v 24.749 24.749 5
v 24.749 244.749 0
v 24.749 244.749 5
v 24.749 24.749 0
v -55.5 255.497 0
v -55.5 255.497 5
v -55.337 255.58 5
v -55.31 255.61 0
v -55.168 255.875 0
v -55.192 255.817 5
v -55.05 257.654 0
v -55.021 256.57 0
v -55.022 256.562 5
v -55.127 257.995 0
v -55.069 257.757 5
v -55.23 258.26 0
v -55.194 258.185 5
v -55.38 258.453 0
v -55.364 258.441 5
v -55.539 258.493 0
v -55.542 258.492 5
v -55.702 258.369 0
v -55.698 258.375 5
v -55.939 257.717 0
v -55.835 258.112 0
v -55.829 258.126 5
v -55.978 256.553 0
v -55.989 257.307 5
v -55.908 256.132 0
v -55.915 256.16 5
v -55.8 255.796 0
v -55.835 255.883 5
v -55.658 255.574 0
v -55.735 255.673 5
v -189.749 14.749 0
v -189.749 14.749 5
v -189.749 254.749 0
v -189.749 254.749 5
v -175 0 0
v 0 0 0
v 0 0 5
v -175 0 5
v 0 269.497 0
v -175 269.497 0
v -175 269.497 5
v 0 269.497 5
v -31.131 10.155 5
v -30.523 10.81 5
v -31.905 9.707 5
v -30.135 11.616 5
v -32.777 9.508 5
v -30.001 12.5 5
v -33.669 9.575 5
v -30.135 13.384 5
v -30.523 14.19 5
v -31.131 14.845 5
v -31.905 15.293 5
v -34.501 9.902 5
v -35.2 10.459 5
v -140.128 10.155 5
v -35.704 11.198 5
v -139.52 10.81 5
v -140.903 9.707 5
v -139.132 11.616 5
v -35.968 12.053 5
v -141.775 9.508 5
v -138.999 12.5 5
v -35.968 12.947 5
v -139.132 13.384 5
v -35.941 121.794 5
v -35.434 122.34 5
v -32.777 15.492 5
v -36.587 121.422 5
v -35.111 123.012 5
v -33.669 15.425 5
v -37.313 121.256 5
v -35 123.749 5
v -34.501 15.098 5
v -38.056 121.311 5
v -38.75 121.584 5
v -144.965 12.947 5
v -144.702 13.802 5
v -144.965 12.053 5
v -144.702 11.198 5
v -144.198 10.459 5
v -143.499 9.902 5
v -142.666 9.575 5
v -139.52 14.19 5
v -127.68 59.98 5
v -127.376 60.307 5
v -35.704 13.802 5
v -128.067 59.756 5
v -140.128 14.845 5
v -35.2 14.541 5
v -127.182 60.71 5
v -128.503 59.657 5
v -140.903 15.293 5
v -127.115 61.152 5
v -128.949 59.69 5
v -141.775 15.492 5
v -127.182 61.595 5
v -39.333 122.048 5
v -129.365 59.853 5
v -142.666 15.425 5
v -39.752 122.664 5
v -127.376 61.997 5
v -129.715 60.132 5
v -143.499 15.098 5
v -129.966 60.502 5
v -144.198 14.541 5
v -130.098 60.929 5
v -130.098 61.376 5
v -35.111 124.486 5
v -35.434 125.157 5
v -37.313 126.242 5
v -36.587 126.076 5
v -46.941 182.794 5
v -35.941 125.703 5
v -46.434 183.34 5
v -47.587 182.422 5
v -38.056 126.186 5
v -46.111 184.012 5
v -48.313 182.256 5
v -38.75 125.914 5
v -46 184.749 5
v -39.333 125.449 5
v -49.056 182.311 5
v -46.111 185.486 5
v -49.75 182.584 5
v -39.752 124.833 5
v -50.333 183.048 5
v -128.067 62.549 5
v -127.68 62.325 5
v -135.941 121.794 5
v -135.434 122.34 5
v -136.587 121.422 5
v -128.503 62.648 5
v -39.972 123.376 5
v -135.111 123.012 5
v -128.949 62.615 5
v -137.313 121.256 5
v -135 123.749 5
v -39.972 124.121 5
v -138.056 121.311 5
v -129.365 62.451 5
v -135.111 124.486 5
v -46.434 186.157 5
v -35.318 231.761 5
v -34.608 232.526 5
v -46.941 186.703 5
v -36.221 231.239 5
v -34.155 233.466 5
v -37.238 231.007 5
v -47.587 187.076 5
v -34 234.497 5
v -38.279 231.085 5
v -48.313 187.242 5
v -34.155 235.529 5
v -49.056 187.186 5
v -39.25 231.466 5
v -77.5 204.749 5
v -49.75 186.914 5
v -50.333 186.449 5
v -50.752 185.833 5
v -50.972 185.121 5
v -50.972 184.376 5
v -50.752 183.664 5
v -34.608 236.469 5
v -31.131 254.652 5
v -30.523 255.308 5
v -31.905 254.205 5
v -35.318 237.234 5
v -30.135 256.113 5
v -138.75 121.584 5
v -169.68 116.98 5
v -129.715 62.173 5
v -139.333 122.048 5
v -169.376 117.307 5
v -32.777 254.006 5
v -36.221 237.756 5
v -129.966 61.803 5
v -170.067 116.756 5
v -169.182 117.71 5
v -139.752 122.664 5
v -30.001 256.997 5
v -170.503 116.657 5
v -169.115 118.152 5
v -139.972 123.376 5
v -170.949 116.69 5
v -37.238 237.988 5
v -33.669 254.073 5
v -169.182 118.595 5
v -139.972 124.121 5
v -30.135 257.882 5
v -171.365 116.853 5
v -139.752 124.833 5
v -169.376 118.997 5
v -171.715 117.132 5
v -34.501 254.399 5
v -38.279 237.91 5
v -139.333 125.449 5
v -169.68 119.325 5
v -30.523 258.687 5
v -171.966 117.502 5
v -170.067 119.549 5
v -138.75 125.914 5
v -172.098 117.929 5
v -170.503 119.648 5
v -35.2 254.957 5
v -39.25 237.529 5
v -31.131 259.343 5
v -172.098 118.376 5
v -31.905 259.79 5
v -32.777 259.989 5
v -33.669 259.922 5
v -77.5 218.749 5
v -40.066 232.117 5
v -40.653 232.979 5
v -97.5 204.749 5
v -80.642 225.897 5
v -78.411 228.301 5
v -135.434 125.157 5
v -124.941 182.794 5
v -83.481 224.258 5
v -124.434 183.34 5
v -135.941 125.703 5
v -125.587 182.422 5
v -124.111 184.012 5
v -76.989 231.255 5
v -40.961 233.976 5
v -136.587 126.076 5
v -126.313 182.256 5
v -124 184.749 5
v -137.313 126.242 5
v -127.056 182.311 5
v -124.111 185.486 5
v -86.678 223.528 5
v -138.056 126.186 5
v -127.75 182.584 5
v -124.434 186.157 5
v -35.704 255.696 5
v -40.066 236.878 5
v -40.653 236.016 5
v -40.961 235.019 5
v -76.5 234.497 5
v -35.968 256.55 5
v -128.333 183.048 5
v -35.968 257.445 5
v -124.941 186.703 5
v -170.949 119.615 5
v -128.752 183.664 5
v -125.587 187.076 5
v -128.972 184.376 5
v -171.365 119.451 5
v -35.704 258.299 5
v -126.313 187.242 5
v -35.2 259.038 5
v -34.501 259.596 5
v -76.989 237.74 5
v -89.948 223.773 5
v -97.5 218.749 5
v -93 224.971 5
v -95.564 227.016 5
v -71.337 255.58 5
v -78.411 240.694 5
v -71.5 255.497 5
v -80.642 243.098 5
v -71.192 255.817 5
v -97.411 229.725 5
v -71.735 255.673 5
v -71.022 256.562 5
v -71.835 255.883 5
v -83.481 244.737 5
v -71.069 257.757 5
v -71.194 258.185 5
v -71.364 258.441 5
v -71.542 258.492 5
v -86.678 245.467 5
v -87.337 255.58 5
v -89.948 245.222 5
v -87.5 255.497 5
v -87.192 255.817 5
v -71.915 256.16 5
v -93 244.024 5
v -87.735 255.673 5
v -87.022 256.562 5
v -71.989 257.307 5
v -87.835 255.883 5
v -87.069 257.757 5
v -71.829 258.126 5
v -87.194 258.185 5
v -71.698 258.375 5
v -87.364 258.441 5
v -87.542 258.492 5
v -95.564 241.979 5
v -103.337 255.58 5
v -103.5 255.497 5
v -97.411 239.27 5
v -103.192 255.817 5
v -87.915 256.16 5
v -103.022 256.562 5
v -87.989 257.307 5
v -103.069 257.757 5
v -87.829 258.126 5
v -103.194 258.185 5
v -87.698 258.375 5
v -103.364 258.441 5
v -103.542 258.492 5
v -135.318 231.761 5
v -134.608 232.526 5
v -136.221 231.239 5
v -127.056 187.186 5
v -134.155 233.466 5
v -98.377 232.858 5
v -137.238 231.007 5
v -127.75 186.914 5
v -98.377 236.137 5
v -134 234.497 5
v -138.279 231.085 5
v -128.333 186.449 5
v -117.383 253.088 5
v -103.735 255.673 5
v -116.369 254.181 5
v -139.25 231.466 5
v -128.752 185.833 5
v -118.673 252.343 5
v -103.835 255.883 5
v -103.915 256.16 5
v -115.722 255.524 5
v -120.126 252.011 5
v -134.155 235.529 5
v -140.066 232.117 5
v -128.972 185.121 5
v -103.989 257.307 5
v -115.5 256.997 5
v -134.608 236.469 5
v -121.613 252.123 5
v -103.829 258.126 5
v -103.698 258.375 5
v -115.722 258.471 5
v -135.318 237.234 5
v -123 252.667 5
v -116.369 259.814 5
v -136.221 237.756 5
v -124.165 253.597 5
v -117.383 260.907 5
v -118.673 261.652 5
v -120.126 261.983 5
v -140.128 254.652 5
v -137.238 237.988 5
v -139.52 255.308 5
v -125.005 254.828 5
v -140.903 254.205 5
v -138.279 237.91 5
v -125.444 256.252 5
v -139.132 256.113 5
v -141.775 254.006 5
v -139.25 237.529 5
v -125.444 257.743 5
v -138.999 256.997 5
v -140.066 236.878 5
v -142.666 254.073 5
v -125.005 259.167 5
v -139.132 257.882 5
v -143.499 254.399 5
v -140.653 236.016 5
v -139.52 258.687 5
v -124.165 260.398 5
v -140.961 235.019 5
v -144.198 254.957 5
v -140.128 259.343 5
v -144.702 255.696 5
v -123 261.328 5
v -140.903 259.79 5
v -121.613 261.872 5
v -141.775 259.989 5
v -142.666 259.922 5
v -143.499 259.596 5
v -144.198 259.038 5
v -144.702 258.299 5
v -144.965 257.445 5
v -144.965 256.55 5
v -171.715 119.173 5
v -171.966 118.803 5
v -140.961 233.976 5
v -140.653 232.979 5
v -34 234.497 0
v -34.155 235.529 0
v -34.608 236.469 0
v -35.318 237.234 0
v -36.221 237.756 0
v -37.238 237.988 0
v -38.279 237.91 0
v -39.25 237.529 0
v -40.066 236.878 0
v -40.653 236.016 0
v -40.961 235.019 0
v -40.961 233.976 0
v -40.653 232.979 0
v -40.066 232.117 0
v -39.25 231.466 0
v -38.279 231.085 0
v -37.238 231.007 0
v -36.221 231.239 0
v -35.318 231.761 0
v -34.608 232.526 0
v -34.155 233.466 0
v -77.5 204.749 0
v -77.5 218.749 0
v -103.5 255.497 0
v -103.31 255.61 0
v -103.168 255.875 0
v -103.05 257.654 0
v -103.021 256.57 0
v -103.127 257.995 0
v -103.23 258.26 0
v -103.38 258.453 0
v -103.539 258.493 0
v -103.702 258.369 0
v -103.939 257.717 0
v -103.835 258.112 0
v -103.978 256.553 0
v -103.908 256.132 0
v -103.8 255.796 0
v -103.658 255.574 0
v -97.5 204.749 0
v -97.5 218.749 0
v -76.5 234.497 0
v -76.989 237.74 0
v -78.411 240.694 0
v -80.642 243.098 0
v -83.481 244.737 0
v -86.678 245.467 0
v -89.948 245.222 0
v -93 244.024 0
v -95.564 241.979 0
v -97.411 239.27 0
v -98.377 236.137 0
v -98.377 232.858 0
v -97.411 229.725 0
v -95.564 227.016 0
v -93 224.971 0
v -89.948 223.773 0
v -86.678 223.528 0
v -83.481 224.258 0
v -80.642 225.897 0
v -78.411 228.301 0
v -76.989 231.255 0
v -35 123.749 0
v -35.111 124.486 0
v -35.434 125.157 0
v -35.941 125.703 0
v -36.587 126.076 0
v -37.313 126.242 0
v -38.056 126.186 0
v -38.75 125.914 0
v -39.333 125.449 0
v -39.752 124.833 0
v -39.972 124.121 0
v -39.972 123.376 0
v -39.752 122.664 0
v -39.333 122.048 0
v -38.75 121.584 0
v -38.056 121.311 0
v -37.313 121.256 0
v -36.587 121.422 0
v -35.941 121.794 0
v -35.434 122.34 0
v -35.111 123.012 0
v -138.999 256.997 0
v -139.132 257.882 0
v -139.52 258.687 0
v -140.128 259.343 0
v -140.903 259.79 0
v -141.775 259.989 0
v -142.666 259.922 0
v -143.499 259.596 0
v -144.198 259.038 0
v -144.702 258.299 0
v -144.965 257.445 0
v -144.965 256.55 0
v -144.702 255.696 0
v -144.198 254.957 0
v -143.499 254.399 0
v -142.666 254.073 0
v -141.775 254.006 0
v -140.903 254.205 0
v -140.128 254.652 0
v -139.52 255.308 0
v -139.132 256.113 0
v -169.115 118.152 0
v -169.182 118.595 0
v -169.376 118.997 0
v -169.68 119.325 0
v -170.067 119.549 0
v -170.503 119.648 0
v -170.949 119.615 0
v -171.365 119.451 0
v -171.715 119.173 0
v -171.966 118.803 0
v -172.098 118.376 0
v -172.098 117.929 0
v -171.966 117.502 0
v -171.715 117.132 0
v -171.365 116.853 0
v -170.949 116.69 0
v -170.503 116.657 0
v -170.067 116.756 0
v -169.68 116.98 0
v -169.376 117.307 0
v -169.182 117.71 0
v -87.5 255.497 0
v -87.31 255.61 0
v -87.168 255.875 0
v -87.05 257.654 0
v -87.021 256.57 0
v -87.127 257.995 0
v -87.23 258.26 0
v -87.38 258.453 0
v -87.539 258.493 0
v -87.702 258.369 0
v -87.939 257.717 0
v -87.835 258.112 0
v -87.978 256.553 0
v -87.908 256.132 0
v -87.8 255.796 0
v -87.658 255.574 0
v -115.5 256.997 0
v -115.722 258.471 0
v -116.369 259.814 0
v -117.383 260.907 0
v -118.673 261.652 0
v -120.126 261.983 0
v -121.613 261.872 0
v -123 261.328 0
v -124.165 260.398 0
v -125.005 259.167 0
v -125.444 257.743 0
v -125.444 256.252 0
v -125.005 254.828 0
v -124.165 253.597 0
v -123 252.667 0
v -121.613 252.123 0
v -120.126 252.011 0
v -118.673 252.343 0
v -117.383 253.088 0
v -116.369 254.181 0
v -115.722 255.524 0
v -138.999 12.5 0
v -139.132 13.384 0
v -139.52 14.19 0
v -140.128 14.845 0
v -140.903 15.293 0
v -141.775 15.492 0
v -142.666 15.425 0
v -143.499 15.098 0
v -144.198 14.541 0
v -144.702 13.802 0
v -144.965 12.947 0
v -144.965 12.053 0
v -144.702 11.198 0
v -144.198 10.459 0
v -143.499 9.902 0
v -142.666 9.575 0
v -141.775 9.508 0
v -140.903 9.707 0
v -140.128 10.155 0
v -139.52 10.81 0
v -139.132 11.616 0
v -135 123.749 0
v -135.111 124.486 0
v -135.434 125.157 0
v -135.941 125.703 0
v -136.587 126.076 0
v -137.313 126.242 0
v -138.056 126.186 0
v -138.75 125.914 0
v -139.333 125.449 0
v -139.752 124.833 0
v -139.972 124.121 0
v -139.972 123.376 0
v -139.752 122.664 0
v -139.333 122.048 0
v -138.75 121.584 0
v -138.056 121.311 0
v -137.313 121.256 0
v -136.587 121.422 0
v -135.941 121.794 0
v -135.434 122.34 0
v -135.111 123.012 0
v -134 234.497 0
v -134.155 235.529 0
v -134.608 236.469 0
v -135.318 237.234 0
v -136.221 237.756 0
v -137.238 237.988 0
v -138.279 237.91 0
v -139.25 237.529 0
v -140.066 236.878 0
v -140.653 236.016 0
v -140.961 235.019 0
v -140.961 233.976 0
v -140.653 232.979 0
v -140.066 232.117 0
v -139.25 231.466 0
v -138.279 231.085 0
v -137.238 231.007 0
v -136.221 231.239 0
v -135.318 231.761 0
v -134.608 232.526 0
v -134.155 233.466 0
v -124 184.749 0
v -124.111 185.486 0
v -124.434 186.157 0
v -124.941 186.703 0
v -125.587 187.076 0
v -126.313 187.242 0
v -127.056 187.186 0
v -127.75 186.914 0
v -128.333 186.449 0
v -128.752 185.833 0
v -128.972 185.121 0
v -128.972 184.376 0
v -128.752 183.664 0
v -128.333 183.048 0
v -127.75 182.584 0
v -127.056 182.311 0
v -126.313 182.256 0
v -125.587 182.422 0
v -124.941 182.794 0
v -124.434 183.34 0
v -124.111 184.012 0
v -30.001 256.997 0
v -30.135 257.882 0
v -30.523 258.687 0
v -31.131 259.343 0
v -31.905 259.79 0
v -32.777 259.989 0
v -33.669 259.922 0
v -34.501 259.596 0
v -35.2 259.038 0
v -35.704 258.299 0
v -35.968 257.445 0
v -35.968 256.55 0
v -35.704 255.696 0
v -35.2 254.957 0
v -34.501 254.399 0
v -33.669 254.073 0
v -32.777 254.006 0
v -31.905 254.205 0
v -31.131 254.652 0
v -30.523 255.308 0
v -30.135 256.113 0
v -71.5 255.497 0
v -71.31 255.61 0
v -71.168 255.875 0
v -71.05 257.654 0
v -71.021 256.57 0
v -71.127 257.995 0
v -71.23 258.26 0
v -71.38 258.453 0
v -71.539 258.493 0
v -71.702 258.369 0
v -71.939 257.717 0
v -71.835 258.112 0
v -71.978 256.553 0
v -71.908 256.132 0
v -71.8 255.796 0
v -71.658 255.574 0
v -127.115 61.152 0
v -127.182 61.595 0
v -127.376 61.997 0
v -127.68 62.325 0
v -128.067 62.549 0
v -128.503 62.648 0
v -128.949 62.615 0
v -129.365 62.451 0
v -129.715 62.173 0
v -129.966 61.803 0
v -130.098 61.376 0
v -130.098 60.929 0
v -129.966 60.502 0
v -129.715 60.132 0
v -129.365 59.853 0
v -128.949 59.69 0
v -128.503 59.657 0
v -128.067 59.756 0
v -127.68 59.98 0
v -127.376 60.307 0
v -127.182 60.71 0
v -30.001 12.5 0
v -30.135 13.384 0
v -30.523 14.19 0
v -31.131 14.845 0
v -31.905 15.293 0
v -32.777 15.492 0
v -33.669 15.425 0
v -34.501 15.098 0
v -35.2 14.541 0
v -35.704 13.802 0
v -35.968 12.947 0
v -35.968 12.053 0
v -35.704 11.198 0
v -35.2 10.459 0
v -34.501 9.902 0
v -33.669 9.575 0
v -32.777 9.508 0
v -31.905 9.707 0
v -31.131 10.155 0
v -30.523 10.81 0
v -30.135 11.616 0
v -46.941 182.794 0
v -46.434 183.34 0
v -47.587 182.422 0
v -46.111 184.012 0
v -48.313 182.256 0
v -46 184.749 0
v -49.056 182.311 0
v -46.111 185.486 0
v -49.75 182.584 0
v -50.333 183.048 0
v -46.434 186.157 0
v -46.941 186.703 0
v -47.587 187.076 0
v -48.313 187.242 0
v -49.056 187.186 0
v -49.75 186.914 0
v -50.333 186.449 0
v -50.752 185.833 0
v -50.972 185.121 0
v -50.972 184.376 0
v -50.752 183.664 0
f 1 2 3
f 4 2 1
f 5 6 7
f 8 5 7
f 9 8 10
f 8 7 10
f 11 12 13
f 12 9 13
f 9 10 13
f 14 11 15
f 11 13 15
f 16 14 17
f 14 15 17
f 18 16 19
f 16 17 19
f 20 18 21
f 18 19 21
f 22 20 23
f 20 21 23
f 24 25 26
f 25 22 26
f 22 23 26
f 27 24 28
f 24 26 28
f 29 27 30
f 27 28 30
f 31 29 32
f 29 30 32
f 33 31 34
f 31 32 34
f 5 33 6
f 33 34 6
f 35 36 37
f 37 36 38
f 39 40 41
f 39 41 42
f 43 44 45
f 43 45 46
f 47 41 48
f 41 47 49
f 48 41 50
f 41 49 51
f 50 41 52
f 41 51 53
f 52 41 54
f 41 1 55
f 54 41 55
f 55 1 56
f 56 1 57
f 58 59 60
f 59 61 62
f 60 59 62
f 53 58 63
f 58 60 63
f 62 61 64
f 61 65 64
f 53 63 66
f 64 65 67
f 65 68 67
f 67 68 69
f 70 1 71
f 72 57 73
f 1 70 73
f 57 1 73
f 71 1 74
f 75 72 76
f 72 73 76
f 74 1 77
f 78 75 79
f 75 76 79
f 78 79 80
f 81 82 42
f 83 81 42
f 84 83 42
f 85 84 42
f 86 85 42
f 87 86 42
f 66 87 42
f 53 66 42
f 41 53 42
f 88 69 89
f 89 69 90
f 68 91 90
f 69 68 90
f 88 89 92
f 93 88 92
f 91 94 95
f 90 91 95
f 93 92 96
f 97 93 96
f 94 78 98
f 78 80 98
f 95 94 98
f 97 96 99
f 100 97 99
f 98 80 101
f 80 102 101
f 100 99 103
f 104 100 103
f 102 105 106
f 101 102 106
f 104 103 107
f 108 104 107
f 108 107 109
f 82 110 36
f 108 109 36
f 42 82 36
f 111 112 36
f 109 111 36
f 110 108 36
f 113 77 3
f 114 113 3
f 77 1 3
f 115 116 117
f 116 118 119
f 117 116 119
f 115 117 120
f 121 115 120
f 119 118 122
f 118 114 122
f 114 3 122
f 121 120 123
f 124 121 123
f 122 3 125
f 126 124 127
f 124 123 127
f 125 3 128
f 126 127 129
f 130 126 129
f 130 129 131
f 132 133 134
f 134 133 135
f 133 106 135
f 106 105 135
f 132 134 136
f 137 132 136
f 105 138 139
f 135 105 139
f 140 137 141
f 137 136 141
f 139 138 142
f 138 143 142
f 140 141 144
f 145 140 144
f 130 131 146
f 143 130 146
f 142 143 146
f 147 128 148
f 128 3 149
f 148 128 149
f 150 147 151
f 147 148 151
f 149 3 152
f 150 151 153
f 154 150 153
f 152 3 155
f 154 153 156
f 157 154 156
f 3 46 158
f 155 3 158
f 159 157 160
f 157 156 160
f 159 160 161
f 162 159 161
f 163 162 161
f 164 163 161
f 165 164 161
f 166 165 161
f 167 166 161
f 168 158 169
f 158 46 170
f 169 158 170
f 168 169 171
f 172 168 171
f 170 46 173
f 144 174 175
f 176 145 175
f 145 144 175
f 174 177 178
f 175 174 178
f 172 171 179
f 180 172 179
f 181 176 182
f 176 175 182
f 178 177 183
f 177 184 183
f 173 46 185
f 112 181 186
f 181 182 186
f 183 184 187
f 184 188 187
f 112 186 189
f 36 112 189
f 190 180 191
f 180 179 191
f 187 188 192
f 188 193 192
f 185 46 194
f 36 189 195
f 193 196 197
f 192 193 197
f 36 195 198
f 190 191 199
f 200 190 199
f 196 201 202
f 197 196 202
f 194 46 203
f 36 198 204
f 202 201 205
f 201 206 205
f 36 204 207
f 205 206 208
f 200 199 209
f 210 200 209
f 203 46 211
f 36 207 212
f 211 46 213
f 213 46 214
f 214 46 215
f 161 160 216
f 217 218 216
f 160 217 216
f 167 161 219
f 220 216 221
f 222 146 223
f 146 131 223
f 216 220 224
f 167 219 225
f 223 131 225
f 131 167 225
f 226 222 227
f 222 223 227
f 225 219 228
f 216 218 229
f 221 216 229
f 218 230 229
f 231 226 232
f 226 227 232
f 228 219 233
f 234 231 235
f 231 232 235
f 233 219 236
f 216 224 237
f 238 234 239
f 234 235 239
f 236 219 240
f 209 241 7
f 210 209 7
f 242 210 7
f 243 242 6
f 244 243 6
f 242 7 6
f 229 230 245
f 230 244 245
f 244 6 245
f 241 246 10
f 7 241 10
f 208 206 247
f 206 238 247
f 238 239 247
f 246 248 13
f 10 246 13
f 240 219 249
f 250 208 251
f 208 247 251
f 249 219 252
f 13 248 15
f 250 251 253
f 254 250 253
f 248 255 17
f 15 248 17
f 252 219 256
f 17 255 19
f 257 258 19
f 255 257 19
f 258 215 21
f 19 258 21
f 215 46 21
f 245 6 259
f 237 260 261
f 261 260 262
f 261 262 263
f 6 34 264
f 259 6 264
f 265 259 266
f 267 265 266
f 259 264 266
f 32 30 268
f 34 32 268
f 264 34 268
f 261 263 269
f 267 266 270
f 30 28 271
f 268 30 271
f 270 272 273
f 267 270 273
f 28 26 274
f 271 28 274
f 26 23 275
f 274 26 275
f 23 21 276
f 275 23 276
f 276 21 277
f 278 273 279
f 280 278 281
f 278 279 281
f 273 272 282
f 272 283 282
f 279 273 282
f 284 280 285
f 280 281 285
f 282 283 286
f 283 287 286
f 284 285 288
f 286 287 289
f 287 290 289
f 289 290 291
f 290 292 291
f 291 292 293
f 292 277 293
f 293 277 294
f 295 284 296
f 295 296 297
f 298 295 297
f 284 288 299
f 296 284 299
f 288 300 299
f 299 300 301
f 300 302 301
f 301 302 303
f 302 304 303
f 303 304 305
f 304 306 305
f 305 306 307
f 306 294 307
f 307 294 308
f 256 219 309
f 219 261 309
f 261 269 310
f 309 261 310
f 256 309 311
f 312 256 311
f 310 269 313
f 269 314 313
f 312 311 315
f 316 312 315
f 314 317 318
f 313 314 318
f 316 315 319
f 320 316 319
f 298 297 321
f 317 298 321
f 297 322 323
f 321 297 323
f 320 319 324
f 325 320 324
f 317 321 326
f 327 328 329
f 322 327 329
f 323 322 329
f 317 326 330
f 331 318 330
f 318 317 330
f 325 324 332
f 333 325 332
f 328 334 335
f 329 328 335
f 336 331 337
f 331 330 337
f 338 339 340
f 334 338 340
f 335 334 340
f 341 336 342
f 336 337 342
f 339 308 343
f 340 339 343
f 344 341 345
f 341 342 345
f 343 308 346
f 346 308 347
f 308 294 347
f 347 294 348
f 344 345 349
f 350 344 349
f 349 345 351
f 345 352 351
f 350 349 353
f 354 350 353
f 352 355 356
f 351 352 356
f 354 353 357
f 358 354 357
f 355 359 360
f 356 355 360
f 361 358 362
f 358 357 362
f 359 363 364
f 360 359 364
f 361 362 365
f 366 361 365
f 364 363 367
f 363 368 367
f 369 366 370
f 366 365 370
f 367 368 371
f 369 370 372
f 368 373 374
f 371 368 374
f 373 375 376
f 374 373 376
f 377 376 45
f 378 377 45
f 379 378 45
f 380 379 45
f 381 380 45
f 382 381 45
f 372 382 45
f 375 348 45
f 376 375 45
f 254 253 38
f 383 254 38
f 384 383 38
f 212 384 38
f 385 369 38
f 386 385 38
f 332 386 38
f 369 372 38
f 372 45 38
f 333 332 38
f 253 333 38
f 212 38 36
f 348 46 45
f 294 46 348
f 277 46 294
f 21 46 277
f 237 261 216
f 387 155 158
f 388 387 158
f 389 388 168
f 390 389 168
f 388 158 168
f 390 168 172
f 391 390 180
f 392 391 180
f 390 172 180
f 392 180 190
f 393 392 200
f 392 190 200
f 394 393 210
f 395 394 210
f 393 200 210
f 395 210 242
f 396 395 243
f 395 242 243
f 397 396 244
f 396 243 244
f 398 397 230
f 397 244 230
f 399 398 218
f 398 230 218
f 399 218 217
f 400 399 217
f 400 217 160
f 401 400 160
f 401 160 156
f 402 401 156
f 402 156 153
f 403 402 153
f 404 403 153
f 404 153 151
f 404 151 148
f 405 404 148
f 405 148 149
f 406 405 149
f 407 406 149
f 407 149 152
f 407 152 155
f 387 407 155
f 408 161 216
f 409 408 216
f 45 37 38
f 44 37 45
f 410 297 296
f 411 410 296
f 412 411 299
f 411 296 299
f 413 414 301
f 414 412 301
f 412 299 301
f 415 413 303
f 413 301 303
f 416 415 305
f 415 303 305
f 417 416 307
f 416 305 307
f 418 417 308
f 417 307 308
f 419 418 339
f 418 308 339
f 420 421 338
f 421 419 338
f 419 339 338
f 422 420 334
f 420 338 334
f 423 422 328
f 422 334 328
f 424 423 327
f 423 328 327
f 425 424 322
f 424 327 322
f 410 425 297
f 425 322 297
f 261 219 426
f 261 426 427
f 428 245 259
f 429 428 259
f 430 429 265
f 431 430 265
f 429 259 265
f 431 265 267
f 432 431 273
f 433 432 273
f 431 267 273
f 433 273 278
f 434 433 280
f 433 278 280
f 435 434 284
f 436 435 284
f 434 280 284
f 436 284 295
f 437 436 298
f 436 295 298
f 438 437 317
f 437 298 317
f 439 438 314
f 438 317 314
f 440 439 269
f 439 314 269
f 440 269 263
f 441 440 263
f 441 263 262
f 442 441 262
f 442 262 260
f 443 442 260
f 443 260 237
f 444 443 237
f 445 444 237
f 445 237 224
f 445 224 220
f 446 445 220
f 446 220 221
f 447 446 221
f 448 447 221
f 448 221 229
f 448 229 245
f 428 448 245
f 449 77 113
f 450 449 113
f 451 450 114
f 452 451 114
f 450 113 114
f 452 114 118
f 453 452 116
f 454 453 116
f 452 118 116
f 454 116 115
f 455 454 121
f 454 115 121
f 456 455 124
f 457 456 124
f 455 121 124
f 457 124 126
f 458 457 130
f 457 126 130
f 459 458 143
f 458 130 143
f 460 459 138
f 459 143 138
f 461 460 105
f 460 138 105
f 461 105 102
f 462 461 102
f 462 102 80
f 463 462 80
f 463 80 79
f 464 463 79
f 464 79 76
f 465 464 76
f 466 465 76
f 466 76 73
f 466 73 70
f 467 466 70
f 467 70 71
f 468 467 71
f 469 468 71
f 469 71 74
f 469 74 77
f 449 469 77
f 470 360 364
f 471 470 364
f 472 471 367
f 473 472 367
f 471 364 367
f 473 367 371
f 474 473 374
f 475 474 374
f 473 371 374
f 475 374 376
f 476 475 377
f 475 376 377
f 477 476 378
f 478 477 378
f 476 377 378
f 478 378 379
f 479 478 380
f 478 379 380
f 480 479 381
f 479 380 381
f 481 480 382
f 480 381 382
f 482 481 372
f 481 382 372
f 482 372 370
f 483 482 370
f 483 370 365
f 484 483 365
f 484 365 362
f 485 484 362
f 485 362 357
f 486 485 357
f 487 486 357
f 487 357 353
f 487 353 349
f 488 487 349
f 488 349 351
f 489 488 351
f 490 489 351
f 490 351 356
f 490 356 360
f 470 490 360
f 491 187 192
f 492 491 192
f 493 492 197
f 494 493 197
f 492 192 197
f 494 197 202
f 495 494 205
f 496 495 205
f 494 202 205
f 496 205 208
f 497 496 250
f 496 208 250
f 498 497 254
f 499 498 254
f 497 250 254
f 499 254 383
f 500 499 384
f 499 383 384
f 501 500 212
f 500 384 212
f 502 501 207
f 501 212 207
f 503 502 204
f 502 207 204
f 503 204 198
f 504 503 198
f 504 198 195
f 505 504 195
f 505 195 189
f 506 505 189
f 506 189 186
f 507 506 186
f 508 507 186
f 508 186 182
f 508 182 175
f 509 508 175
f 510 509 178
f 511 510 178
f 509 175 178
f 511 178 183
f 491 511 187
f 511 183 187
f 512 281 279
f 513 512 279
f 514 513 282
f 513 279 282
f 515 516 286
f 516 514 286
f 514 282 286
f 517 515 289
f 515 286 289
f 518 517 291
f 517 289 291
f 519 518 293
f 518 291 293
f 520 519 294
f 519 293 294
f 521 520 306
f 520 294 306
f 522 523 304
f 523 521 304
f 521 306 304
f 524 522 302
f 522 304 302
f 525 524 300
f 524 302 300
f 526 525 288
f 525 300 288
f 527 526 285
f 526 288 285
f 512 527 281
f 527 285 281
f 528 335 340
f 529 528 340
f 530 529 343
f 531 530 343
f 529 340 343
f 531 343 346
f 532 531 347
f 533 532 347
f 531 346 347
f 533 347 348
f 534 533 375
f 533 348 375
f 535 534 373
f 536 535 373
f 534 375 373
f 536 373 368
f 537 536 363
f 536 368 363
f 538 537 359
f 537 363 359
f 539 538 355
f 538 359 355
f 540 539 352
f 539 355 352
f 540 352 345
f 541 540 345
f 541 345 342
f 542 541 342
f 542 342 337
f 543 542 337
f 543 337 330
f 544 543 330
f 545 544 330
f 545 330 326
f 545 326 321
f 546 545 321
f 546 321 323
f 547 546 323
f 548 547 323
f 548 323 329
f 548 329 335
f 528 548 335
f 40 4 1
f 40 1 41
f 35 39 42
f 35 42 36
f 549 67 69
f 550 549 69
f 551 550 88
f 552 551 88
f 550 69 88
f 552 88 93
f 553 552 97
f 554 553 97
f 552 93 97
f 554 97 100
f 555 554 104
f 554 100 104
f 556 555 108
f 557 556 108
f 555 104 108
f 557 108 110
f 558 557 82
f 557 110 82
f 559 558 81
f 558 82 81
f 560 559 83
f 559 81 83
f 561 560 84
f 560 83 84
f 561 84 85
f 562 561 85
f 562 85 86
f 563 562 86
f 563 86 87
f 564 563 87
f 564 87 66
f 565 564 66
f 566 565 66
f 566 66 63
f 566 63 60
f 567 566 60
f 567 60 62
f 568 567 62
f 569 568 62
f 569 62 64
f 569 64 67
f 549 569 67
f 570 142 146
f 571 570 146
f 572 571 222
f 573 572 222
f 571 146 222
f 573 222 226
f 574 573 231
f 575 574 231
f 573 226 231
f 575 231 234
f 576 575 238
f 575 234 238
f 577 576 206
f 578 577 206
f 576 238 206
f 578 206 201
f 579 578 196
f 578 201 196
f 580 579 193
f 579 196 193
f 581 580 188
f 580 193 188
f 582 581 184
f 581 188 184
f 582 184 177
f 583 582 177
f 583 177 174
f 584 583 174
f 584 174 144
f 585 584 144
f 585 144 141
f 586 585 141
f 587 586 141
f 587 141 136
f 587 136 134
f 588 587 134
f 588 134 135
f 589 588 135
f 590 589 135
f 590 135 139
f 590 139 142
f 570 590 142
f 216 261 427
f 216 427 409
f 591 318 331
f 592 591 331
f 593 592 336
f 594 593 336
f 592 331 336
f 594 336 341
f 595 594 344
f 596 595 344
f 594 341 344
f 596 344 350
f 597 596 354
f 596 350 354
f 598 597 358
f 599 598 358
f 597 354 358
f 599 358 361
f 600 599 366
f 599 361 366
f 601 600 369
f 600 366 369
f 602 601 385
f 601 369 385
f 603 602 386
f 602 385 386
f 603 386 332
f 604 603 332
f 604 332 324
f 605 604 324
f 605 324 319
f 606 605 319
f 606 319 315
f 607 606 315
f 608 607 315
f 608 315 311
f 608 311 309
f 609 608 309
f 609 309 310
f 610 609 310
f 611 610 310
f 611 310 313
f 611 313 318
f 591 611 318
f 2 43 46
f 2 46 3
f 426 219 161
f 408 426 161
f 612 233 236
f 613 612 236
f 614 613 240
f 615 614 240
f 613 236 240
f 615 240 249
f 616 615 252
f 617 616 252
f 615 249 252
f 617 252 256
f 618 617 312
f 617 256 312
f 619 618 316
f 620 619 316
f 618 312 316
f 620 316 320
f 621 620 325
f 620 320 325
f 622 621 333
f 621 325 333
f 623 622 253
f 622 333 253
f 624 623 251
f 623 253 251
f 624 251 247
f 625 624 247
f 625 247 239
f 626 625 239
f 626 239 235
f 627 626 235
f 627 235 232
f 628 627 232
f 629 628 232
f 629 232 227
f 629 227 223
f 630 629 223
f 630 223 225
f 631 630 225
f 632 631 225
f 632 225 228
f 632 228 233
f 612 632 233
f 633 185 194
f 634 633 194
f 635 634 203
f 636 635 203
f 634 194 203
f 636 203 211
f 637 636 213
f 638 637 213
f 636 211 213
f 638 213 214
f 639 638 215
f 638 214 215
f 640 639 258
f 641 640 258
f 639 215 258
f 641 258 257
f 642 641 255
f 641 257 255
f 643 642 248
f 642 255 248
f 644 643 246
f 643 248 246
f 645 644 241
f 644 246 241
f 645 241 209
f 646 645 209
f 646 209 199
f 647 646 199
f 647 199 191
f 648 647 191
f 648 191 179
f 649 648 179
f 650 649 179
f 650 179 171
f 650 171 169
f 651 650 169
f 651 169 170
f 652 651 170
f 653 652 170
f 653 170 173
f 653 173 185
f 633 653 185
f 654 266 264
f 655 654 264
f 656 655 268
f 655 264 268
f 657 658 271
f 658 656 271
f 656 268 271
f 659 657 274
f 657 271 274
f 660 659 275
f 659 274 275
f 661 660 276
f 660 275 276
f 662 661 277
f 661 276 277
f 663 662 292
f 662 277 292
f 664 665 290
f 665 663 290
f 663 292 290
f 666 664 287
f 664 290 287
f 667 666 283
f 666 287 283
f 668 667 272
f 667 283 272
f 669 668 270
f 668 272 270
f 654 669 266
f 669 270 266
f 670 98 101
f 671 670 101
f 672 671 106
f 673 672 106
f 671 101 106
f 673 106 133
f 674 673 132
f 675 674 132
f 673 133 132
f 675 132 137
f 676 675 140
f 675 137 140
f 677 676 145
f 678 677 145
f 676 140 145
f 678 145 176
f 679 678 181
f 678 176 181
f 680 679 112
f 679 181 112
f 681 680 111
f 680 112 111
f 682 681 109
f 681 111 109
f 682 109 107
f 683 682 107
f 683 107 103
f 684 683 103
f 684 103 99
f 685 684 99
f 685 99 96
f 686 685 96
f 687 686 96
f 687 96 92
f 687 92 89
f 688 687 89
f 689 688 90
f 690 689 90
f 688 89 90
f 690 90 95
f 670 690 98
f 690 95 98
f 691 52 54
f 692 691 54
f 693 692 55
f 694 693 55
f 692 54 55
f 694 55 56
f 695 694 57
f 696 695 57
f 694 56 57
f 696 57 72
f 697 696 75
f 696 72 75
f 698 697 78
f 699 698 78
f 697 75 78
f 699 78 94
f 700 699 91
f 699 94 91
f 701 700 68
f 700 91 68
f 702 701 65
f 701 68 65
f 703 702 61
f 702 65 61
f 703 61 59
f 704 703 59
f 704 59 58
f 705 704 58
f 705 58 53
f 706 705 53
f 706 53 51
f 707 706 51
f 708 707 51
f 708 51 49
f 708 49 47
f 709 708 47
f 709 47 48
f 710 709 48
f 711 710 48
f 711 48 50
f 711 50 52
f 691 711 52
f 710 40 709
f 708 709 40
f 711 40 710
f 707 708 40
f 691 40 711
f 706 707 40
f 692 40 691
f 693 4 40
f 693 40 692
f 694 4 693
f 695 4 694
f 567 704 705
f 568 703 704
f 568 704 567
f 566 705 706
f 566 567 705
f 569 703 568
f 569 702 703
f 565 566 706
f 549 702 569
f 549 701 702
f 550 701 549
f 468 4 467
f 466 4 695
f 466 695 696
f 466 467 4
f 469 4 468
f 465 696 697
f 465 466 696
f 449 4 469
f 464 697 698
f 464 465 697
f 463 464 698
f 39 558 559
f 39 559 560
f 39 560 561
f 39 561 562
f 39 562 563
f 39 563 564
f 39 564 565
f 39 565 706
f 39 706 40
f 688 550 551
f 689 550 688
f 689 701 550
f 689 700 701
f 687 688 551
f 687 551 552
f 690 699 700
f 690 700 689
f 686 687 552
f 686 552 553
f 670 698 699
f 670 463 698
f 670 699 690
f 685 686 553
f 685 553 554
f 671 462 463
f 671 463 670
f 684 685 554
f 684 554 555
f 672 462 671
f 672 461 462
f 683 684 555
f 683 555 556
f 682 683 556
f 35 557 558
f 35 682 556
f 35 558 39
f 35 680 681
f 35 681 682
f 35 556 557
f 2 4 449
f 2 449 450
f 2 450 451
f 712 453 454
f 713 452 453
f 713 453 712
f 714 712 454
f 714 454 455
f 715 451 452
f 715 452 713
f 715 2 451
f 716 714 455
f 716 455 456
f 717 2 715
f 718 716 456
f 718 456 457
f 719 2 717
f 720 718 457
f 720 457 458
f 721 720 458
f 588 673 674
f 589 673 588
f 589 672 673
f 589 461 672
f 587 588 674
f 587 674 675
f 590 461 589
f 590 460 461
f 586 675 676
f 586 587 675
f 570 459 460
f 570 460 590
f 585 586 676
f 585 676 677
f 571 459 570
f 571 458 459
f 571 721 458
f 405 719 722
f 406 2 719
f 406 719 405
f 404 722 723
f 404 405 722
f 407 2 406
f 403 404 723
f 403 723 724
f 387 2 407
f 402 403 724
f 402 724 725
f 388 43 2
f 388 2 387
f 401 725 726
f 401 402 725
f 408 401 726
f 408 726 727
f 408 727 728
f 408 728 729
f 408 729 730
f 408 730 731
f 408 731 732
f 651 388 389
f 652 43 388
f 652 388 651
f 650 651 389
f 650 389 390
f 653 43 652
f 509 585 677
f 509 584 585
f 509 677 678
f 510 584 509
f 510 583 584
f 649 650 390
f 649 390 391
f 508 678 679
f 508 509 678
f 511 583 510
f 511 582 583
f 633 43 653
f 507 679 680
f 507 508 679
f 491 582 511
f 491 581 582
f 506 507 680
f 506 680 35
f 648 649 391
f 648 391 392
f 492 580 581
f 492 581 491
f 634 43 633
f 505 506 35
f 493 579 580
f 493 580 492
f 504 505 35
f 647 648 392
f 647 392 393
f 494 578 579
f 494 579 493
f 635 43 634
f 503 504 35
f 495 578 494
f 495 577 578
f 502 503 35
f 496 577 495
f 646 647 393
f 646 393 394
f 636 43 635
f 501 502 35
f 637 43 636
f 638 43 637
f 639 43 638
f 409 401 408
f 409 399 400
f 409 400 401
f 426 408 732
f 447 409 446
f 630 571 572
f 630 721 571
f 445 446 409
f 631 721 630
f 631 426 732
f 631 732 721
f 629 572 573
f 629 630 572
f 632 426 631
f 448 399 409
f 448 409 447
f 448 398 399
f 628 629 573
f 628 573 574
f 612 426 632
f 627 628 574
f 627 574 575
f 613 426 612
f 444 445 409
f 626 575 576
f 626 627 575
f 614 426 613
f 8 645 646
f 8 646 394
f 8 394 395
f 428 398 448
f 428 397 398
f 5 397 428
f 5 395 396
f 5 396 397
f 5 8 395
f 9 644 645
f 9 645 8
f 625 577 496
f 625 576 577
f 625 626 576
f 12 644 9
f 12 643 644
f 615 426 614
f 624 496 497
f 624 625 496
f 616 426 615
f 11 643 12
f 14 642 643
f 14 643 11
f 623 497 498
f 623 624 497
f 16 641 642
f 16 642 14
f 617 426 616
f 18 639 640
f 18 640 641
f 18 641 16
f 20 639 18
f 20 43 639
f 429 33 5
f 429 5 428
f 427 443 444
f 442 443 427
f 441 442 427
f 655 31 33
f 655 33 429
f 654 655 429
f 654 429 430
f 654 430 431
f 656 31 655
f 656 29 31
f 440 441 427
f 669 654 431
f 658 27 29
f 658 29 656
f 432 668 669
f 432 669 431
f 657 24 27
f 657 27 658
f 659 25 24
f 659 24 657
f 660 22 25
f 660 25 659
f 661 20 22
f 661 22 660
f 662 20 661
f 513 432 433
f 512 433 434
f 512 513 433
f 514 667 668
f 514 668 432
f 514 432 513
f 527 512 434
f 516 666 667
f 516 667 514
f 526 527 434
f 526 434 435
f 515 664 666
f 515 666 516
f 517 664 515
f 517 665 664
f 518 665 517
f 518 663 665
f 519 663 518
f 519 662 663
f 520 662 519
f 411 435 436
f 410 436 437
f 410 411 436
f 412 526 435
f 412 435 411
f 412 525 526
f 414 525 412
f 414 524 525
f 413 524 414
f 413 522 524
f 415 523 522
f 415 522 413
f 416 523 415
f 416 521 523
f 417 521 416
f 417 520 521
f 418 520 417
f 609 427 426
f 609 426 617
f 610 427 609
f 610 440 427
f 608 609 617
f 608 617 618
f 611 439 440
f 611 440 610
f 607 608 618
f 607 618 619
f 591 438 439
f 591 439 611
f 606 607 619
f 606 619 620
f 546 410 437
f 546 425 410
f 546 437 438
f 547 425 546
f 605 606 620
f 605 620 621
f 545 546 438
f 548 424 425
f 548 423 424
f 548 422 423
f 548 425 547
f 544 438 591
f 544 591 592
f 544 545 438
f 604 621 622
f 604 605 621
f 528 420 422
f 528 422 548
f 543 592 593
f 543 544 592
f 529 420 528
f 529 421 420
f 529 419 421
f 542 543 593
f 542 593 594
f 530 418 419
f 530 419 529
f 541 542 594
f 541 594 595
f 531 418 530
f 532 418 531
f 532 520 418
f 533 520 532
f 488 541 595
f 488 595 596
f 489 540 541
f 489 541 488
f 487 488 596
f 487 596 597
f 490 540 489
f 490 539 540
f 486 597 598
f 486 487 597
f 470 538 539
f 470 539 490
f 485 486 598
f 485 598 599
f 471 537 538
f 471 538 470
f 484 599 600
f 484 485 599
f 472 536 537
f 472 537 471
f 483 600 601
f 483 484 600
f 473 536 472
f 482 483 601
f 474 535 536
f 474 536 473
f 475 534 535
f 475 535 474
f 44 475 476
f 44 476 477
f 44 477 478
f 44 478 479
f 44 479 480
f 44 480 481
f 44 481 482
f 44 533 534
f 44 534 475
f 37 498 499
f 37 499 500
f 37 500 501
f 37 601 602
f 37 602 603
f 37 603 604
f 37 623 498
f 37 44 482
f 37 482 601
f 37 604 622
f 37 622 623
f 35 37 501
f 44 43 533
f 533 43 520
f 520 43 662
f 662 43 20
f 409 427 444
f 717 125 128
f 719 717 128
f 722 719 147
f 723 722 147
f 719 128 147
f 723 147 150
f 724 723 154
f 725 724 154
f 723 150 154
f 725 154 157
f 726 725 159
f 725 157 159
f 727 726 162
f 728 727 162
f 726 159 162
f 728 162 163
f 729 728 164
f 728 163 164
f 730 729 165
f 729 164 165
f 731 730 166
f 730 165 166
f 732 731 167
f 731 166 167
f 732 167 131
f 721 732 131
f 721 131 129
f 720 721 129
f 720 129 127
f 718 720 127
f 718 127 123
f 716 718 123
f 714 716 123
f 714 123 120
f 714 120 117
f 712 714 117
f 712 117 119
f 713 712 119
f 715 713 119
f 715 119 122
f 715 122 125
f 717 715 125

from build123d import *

# Parameters (mm, degrees)
BASE_DEPTH               = 5
ESQUISSE8_R              = 5
ENL_V_MAT_EXTRU_7_DEPTH  = 10
ESQUISSE4_R              = 11
ESQUISSE4_R_2            = 3.5
ESQUISSE4_RX             = 1.5
ESQUISSE4_RY             = 0.5
ESQUISSE4_W              = 20
ESQUISSE4_H              = 14
ENL_V_MAT_EXTRU_8_DEPTH  = 10
ESQUISSE2_R              = 3
ESQUISSE2_R_2            = 2.5
ENL_V_MAT_EXTRU_9_DEPTH  = 10
ESQUISSE11_R             = 1.5
ENL_V_MAT_EXTRU_11_DEPTH = 5


with BuildPart() as part:
    # Esquisse1 → Base (new body)
    with BuildSketch(Plane.XY):
        Polygon((0, 0), (-175, 0), (-199.748737342, 24.748737342), (-199.748737342, 244.748737342), (-175, 269.497474683), (0, 269.497474683), (24.748737342, 244.748737342), (24.748737342, 24.748737342), align=None)
    extrude(amount=BASE_DEPTH)

    # Esquisse8 → Enlèv. mat.-Extru.7 (cut)
    with BuildSketch(Plane.XY.offset(5)):
        with Locations((-120.5, 256.997474683)):
            Circle(ESQUISSE8_R)
    extrude(amount=-ENL_V_MAT_EXTRU_7_DEPTH, mode=Mode.SUBTRACT)

    # Esquisse4 → Enlèv. mat.-Extru.8 (cut)
    with BuildSketch(Plane.XY.offset(5)):
        with Locations((-87.5, 234.497474683)):
            Circle(ESQUISSE4_R)
        with Locations((-137.5, 234.497474683)):
            Circle(ESQUISSE4_R_2)
        with Locations((-37.5, 234.497474683)):
            Circle(ESQUISSE4_R_2)
        with Locations(Location((-103.5, 256.997474683), (0, 0, -90))):
            Ellipse(ESQUISSE4_RX, ESQUISSE4_RY)
        with Locations(Location((-87.5, 256.997474683), (0, 0, -90))):
            Ellipse(ESQUISSE4_RX, ESQUISSE4_RY)
        with Locations(Location((-71.5, 256.997474683), (0, 0, -90))):
            Ellipse(ESQUISSE4_RX, ESQUISSE4_RY)
        with Locations(Location((-55.5, 256.997474683), (0, 0, -90))):
            Ellipse(ESQUISSE4_RX, ESQUISSE4_RY)
        with Locations((-87.5, 211.748737342)):
            Rectangle(ESQUISSE4_W, ESQUISSE4_H)
    extrude(amount=-ENL_V_MAT_EXTRU_8_DEPTH, mode=Mode.SUBTRACT)

    # Esquisse2 → Enlèv. mat.-Extru.9 (cut)
    with BuildSketch(Plane.XY.offset(5)):
        with Locations((-141.998737342, 12.5)):
            Circle(ESQUISSE2_R)
        with Locations((-141.998737342, 256.997474683)):
            Circle(ESQUISSE2_R)
        with Locations((-33.001262658, 12.5)):
            Circle(ESQUISSE2_R)
        with Locations((-33.001262658, 256.997474683)):
            Circle(ESQUISSE2_R)
        with Locations((-137.5, 123.748737342)):
            Circle(ESQUISSE2_R_2)
        with Locations((-126.5, 184.748737342)):
            Circle(ESQUISSE2_R_2)
        with Locations((-37.5, 123.748737342)):
            Circle(ESQUISSE2_R_2)
        with Locations((-48.5, 184.748737342)):
            Circle(ESQUISSE2_R_2)
    extrude(amount=-ENL_V_MAT_EXTRU_9_DEPTH, mode=Mode.SUBTRACT)

    # Esquisse11 → Enlèv. mat.-Extru.11 (cut)
    with BuildSketch(Plane.XY.offset(5)):
        with Locations((-170.614939475, 118.152371839)):
            Circle(ESQUISSE11_R)
        with Locations((-128.614939475, 61.152371839)):
            Circle(ESQUISSE11_R)
        Polygon((-189.748737342, -12.261016229), (-189.748737342, 134.748737342), (-189.748737342, 274.920827955), (-199.748737342, 274.920827955), (-199.748737342, -12.261016229), align=None)
    extrude(amount=-ENL_V_MAT_EXTRU_11_DEPTH, mode=Mode.SUBTRACT)


solid = part.part
